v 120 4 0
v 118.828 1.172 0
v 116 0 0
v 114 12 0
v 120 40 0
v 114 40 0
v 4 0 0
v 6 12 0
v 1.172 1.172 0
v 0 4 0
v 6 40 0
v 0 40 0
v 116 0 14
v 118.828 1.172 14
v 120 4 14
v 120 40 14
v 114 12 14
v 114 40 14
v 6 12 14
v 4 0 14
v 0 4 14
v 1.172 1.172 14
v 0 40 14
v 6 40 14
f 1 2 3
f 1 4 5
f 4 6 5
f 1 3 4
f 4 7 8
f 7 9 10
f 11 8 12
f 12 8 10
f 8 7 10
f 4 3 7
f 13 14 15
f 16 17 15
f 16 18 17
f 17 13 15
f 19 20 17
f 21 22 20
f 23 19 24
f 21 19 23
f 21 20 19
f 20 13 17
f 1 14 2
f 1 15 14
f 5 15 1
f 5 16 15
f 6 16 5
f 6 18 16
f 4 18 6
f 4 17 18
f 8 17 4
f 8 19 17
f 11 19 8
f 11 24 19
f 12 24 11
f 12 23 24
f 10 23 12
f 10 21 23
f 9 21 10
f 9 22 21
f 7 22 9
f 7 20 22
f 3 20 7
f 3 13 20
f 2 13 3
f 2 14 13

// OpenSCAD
$fn = 32;

// ----------------------------------------------------------------------
// Heat sink frame: 120 x 40 mm frame, 6 mm walls
// ----------------------------------------------------------------------

// --- parameters (mm) ---
profile_height = 14;      // extrusion height
profile_points = 12;      // points of the closed outline

profile = [[0, 4], [1.172, 1.172], [4, 0], [116, 0], [118.828, 1.172], [120, 4], [120, 40], [114, 40], [114, 12], [6, 12], [6, 40], [0, 40]];  // single closed polygon, 12 points, counter clockwise

// --- the one profile operation ---
linear_extrude(height = profile_height) polygon(points = profile);
